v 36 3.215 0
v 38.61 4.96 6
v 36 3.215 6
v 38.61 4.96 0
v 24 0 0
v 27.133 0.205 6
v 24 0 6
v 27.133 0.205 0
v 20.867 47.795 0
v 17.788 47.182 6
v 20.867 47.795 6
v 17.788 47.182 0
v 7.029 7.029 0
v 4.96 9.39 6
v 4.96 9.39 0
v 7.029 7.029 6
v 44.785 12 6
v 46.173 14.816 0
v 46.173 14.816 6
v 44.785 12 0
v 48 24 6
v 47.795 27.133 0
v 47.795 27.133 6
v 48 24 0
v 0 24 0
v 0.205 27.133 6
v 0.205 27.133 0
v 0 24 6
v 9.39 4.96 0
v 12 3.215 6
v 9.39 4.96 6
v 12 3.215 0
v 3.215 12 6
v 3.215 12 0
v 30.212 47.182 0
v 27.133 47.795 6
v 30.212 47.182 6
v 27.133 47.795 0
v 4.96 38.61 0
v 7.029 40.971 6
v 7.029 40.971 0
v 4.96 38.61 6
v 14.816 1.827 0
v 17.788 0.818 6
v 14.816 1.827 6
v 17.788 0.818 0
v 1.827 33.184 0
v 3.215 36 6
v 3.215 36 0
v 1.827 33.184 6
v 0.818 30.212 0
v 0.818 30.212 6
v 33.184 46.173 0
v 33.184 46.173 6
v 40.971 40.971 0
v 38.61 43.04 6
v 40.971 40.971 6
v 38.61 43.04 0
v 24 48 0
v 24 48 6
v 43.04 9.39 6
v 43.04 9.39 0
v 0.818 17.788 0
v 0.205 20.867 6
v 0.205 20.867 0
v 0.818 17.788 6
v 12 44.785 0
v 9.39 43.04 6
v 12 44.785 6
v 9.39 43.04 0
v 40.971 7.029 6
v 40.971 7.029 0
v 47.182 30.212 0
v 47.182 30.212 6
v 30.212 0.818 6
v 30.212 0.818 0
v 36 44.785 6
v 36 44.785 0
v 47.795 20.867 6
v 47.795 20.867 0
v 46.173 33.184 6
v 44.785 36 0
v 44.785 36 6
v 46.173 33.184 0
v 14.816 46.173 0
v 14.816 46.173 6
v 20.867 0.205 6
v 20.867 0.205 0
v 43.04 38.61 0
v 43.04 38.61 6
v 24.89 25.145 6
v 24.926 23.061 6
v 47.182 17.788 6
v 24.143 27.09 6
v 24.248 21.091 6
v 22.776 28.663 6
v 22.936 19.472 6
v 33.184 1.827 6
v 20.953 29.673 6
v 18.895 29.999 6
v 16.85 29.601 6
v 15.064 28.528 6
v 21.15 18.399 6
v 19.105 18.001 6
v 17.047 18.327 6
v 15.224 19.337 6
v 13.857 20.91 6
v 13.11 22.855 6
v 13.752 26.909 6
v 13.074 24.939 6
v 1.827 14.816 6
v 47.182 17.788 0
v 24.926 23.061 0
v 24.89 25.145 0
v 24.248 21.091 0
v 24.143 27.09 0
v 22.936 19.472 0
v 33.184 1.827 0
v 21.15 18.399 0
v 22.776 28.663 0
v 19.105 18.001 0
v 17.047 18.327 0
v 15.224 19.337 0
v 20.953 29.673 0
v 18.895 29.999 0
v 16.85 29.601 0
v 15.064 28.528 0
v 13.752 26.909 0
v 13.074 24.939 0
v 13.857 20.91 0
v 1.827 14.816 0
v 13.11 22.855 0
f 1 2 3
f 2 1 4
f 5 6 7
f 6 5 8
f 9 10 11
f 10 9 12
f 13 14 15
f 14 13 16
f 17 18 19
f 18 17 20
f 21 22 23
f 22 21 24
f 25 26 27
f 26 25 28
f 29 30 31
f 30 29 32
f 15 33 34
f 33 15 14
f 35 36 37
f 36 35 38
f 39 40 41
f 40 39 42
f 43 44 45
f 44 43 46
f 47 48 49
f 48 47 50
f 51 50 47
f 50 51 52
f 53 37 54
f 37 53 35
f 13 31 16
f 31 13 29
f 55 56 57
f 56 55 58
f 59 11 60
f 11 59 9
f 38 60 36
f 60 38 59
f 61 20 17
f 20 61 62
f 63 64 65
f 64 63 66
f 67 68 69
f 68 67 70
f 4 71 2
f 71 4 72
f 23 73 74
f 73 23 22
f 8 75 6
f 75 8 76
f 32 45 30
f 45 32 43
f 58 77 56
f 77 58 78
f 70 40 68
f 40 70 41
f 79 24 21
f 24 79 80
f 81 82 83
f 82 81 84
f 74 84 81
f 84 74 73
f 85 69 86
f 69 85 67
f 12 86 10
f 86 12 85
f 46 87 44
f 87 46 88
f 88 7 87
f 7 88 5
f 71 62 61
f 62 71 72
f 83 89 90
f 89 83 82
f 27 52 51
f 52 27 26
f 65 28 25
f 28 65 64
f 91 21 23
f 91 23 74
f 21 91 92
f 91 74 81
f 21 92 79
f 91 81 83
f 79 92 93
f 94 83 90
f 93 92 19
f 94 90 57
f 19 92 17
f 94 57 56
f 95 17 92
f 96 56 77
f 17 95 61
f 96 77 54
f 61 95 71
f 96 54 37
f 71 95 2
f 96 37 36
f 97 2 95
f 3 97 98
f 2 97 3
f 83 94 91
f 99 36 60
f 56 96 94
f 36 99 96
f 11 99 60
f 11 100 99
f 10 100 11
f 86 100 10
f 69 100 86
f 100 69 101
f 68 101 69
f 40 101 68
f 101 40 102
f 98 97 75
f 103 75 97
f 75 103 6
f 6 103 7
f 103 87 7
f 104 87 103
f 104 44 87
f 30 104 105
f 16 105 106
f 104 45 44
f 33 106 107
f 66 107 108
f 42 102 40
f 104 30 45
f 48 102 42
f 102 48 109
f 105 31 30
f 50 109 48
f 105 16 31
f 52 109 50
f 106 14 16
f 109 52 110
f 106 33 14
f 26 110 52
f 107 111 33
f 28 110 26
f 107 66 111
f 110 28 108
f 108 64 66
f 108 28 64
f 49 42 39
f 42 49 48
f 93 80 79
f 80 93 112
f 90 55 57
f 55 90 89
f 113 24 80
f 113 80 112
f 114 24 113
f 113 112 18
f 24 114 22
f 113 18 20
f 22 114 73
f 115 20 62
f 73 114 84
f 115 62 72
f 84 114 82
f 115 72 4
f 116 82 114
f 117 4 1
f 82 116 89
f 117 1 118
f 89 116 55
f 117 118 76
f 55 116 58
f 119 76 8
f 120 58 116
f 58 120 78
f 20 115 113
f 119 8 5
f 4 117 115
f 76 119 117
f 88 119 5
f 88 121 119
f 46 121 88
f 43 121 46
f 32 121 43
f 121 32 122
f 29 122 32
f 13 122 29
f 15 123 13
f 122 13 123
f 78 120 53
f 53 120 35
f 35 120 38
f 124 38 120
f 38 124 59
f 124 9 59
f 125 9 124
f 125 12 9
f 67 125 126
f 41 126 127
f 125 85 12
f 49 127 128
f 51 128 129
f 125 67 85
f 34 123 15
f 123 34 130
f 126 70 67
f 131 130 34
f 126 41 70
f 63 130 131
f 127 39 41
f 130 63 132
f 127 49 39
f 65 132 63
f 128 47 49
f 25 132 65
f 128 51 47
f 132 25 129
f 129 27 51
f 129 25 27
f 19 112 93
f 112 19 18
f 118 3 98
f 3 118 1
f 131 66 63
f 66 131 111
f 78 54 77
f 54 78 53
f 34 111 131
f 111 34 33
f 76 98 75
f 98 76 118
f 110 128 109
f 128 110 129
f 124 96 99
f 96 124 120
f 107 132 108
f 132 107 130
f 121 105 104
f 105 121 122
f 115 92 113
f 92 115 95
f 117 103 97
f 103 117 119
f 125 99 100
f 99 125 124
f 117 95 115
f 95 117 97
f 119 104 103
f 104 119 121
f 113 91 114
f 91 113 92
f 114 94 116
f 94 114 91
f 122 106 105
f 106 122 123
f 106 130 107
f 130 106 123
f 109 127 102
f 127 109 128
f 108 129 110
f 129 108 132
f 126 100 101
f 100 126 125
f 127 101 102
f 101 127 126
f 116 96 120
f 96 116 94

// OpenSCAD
$fn = 32;

// ----------------------------------------------------------------------
// Cam plate: eccentric cam, base R24
// ----------------------------------------------------------------------

// --- parameters (mm) ---
base_r = 24;              // base circle radius
lobe_h = 12;              // cam lobe rise
bore_r = 6;               // shaft bore radius
plate_t = 6;              // plate thickness, Z (extrusion height)
ecc = 5;                  // disc eccentricity

profile = [[48, 24], [47.795, 27.133], [47.182, 30.212], [46.173, 33.184], [44.785, 36], [43.04, 38.61], [40.971, 40.971], [38.61, 43.04], [36, 44.785], [33.184, 46.173], [30.212, 47.182], [27.133, 47.795], [24, 48], [20.867, 47.795], [17.788, 47.182], [14.816, 46.173], [12, 44.785], [9.39, 43.04], [7.029, 40.971], [4.96, 38.61], [3.215, 36], [1.827, 33.184], [0.818, 30.212], [0.205, 27.133], [0, 24], [0.205, 20.867], [0.818, 17.788], [1.827, 14.816], [3.215, 12], [4.96, 9.39], [7.029, 7.029], [9.39, 4.96], [12, 3.215], [14.816, 1.827], [17.788, 0.818], [20.867, 0.205], [24, 0], [27.133, 0.205], [30.212, 0.818], [33.184, 1.827], [36, 3.215], [38.61, 4.96], [40.971, 7.029], [43.04, 9.39], [44.785, 12], [46.173, 14.816], [47.182, 17.788], [47.795, 20.867]];  // primary outline, 48 points, counter clockwise
void_1 = [[24.89, 25.145], [24.143, 27.09], [22.776, 28.663], [20.953, 29.673], [18.895, 29.999], [16.85, 29.601], [15.064, 28.528], [13.752, 26.909], [13.074, 24.939], [13.11, 22.855], [13.857, 20.91], [15.224, 19.337], [17.047, 18.327], [19.105, 18.001], [21.15, 18.399], [22.936, 19.472], [24.248, 21.091], [24.926, 23.061]];  // shaft bore, 18 points

// --- the one profile operation ---
difference() {
  linear_extrude(height = plate_t) polygon(points = profile);
  translate([0, 0, -1])
    linear_extrude(height = plate_t + 2) polygon(points = void_1);
}
